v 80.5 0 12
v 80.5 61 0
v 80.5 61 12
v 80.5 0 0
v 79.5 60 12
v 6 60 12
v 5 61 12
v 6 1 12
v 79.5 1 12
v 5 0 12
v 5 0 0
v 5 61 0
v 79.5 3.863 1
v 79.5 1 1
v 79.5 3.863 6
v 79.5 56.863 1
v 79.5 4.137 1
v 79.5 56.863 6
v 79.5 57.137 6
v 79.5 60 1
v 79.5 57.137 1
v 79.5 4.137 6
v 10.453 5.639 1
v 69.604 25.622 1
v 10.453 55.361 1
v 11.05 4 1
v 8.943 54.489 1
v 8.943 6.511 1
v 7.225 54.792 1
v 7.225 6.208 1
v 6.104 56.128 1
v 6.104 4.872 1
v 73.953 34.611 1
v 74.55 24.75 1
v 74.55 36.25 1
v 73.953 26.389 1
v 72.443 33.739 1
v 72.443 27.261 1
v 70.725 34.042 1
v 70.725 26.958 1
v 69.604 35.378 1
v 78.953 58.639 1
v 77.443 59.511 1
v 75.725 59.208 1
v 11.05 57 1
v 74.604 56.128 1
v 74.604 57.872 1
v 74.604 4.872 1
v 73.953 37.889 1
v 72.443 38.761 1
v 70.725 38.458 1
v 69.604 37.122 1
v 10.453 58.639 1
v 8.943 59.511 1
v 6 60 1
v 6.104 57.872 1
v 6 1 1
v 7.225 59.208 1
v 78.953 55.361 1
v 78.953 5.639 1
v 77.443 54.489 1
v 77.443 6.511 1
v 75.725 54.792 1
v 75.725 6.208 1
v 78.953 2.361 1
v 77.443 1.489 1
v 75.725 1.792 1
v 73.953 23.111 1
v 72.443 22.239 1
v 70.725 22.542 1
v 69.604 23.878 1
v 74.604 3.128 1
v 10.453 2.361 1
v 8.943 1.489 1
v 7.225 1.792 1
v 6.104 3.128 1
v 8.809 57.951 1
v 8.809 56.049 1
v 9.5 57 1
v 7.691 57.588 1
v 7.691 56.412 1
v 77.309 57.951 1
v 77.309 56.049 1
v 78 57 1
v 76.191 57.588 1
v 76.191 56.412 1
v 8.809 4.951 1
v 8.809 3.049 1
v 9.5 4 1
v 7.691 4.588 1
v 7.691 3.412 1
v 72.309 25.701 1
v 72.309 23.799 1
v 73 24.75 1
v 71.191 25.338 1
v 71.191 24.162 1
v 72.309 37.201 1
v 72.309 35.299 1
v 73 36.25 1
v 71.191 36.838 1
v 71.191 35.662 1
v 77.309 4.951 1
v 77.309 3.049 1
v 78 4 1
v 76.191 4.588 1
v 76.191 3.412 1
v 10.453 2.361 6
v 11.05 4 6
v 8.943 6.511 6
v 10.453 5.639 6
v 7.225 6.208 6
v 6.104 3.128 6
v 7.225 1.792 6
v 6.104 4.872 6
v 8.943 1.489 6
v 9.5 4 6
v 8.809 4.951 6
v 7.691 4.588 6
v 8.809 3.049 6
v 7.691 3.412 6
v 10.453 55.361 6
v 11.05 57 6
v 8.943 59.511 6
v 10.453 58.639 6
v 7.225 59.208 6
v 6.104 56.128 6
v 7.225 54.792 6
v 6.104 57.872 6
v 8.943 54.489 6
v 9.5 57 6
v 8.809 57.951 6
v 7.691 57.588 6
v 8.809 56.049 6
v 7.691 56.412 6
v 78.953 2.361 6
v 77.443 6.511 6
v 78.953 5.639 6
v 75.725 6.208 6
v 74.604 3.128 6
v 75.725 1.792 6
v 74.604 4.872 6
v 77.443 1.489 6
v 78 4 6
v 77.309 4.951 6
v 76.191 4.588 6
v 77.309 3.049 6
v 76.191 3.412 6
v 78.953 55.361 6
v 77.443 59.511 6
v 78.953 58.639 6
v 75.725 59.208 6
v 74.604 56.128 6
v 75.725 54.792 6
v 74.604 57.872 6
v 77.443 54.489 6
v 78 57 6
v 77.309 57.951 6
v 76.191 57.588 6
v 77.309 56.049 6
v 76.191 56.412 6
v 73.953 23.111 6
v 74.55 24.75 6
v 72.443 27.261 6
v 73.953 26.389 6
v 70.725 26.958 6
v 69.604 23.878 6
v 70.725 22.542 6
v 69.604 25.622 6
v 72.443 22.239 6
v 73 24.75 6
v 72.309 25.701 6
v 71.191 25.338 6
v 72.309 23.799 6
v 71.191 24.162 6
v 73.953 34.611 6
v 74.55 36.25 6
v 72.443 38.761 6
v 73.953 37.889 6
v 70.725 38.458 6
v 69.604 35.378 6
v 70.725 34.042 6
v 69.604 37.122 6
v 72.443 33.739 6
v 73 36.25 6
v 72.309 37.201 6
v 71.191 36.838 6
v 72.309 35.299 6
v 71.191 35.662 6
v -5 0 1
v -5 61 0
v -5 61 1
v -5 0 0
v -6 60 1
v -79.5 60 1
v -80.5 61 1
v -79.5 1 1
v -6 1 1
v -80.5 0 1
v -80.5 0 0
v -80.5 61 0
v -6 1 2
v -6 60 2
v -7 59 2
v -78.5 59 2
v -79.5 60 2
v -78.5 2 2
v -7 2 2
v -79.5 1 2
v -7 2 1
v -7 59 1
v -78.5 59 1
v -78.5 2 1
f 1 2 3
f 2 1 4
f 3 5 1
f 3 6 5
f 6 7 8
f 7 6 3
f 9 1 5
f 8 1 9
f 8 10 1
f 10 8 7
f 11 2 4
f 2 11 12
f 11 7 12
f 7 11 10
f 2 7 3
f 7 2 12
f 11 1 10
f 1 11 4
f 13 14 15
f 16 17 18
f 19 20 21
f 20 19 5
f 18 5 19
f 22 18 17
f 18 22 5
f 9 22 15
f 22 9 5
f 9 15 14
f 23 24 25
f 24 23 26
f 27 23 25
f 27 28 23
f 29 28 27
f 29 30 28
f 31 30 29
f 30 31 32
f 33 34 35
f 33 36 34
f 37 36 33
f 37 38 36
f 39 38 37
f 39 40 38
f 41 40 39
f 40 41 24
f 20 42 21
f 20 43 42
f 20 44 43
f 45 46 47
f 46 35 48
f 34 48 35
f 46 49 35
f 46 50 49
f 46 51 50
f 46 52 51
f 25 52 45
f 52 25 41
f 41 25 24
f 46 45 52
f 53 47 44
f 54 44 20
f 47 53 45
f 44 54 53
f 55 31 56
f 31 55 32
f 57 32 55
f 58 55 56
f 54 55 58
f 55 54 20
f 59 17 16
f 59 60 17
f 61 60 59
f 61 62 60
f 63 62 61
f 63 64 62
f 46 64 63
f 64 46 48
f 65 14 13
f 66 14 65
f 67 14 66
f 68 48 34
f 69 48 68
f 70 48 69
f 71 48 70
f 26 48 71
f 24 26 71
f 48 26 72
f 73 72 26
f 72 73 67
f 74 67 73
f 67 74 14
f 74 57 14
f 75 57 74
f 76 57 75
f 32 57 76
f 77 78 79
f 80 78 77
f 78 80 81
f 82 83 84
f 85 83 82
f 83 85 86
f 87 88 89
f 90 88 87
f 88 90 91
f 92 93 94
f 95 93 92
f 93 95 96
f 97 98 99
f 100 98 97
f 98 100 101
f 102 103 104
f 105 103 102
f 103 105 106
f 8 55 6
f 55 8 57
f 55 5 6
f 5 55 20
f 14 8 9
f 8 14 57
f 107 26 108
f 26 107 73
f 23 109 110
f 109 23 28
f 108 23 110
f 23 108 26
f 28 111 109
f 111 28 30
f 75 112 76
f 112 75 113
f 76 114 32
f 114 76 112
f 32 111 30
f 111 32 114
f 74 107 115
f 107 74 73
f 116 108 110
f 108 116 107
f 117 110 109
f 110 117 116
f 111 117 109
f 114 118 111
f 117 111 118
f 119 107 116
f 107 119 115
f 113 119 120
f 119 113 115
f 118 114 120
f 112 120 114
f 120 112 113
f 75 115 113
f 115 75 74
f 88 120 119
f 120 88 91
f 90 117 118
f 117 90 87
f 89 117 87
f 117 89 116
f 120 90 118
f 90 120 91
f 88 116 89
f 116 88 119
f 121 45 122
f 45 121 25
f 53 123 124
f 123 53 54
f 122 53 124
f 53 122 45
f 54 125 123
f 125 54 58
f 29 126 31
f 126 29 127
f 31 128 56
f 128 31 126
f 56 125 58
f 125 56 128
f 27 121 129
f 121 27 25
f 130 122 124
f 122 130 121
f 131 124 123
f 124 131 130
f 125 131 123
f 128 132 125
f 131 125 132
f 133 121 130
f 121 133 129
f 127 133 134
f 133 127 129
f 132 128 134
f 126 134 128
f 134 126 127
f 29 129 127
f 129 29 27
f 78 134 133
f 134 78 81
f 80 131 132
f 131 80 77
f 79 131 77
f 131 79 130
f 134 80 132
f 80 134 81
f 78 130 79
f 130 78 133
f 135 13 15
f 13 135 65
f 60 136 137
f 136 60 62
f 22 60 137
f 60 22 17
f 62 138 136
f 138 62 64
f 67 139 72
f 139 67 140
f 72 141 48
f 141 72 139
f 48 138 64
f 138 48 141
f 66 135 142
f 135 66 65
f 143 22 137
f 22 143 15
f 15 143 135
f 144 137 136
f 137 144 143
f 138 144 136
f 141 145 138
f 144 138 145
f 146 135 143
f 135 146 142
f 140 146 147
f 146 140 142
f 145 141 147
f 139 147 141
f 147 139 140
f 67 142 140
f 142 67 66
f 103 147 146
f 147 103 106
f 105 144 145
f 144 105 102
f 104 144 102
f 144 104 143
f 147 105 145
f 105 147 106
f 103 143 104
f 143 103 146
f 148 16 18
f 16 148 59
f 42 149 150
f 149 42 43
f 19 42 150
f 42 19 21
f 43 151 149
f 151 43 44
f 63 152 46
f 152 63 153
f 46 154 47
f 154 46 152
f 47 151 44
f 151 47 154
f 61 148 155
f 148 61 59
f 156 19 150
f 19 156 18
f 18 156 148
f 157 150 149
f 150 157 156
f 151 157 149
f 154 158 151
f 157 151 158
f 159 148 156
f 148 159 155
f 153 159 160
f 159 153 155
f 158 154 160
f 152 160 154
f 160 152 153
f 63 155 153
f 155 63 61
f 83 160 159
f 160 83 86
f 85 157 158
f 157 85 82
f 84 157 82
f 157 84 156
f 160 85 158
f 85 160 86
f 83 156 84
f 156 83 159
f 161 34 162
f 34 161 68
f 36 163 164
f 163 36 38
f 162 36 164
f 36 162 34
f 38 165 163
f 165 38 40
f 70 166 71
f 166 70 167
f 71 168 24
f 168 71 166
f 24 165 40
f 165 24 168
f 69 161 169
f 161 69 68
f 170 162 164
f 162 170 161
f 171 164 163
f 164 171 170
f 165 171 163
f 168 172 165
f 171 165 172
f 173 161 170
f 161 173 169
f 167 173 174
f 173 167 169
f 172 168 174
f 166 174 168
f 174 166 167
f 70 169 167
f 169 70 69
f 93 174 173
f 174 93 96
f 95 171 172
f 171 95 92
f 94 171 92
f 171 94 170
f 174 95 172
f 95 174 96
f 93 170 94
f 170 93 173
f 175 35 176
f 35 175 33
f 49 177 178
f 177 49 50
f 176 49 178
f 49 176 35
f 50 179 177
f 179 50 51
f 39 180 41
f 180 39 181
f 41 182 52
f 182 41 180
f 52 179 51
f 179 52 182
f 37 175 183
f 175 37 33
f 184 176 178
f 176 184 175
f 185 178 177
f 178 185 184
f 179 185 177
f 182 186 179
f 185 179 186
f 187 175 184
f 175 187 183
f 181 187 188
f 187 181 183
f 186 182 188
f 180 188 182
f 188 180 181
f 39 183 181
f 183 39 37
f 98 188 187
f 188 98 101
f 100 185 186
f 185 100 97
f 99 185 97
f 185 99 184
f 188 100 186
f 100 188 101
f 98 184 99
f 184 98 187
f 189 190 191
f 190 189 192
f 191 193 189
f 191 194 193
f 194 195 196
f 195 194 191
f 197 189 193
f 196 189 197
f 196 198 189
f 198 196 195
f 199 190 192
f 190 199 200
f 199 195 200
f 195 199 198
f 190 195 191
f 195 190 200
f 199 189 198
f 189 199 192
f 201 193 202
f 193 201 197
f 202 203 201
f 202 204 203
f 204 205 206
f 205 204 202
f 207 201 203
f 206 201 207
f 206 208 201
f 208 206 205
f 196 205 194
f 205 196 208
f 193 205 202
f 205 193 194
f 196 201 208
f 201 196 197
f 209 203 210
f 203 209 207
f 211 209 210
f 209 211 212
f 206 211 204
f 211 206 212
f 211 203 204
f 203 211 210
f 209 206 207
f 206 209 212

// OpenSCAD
// This version of the box and lid design is specialized as a case for
// the Nanode circuit board.
//
// @@TODO include generic stuff by reference rather than value as now
//

delta = 0.1;
spacing = 5;

module box(l, w, h, t)
{
  t2 = t * 2;
  difference()
  {
    cube( size=[l,w,h] );
    translate([t,t,t])
      cube( size=[l-t2, w-t2, h-t]) ;
  }
}

module lid(l, w, t)
{
  t2 = t * 2;
  t4 = t * 4;
  difference()
  {
    union()
    {
      cube( size=[l, w, t] );
      translate( [t, t, t*0.5] )
        cube( size=[l-t2, w-t2, t*1.5] );
    }
    translate( [t2, t2, t] )
      cube( size=[l-t4, w-t4, t2] );
  }
}

module support(dl, dw, h, od, id, delta)
{
  //translate([dl+od/2, dw+od/2, delta])
  translate([dl, dw, delta])
    difference()
    { 
      cylinder(h=h-delta, r=od/2, $fa=30);
      translate([0,0,-delta])
        cylinder(h=h+delta, r=id/2, $fa=30);
    }
}

module case(l, w, h, t)
{
  // TBD...
  translate([spacing,0,0])
    box(l, w, h, t);
  translate([-spacing-l, 0, 0])
    lid(l, w, t);
}

// Nanode board:
nanode_length   = 72.5;
nanode_width    = 58;
nanode_hole_dia = 3;

nanode_hole_1_x = 2;
nanode_hole_1_y = 2.5;
nanode_hole_2_x = 2;
nanode_hole_2_y = 55.5;

nanode_hole_3_x = 70.5;
nanode_hole_3_y = 2.5;
nanode_hole_4_x = 70.5;
nanode_hole_4_y = 55.5;

nanode_hole_5_x = 65.5;  	// 7.0 from other end
nanode_hole_5_y = 23.25;
nanode_hole_6_x = 65.5;  	// 7.0 from other end
nanode_hole_6_y = 34.75;		// pitch 11.5

// Try it out
t = 1;		// Wall thickness
g = 0.5;       // gap around PCB
l = nanode_length+2*t+g*2;		// Length
w = nanode_width+2*t+g*2;		// Width
h = 12;		// Height
s = spacing;	// Spacing

translate([s,0,0])
{
  box(l, w, h, t);
  support(t+g+nanode_hole_1_x, t+g+nanode_hole_1_y, h*0.5, 5.1, 2, t/2); 
  support(t+g+nanode_hole_2_x, t+g+nanode_hole_2_y, h*0.5, 5.1, 2, t/2); 
  support(t+g+nanode_hole_3_x, t+g+nanode_hole_3_y, h*0.5, 5.1, 2, t/2); 
  support(t+g+nanode_hole_4_x, t+g+nanode_hole_4_y, h*0.5, 5.1, 2, t/2); 
  support(t+g+nanode_hole_5_x, t+g+nanode_hole_5_y, h*0.5, 5.1, 2, t/2); 
  support(t+g+nanode_hole_6_x, t+g+nanode_hole_6_y, h*0.5, 5.1, 2, t/2); 
}

translate([-s-l, 0, 0])
  lid(l, w, t);

//support(t+g+nanode_hole_1_x, t+g+nanode_hole_1_y, h*0.5, 5, 2, t/2); 
